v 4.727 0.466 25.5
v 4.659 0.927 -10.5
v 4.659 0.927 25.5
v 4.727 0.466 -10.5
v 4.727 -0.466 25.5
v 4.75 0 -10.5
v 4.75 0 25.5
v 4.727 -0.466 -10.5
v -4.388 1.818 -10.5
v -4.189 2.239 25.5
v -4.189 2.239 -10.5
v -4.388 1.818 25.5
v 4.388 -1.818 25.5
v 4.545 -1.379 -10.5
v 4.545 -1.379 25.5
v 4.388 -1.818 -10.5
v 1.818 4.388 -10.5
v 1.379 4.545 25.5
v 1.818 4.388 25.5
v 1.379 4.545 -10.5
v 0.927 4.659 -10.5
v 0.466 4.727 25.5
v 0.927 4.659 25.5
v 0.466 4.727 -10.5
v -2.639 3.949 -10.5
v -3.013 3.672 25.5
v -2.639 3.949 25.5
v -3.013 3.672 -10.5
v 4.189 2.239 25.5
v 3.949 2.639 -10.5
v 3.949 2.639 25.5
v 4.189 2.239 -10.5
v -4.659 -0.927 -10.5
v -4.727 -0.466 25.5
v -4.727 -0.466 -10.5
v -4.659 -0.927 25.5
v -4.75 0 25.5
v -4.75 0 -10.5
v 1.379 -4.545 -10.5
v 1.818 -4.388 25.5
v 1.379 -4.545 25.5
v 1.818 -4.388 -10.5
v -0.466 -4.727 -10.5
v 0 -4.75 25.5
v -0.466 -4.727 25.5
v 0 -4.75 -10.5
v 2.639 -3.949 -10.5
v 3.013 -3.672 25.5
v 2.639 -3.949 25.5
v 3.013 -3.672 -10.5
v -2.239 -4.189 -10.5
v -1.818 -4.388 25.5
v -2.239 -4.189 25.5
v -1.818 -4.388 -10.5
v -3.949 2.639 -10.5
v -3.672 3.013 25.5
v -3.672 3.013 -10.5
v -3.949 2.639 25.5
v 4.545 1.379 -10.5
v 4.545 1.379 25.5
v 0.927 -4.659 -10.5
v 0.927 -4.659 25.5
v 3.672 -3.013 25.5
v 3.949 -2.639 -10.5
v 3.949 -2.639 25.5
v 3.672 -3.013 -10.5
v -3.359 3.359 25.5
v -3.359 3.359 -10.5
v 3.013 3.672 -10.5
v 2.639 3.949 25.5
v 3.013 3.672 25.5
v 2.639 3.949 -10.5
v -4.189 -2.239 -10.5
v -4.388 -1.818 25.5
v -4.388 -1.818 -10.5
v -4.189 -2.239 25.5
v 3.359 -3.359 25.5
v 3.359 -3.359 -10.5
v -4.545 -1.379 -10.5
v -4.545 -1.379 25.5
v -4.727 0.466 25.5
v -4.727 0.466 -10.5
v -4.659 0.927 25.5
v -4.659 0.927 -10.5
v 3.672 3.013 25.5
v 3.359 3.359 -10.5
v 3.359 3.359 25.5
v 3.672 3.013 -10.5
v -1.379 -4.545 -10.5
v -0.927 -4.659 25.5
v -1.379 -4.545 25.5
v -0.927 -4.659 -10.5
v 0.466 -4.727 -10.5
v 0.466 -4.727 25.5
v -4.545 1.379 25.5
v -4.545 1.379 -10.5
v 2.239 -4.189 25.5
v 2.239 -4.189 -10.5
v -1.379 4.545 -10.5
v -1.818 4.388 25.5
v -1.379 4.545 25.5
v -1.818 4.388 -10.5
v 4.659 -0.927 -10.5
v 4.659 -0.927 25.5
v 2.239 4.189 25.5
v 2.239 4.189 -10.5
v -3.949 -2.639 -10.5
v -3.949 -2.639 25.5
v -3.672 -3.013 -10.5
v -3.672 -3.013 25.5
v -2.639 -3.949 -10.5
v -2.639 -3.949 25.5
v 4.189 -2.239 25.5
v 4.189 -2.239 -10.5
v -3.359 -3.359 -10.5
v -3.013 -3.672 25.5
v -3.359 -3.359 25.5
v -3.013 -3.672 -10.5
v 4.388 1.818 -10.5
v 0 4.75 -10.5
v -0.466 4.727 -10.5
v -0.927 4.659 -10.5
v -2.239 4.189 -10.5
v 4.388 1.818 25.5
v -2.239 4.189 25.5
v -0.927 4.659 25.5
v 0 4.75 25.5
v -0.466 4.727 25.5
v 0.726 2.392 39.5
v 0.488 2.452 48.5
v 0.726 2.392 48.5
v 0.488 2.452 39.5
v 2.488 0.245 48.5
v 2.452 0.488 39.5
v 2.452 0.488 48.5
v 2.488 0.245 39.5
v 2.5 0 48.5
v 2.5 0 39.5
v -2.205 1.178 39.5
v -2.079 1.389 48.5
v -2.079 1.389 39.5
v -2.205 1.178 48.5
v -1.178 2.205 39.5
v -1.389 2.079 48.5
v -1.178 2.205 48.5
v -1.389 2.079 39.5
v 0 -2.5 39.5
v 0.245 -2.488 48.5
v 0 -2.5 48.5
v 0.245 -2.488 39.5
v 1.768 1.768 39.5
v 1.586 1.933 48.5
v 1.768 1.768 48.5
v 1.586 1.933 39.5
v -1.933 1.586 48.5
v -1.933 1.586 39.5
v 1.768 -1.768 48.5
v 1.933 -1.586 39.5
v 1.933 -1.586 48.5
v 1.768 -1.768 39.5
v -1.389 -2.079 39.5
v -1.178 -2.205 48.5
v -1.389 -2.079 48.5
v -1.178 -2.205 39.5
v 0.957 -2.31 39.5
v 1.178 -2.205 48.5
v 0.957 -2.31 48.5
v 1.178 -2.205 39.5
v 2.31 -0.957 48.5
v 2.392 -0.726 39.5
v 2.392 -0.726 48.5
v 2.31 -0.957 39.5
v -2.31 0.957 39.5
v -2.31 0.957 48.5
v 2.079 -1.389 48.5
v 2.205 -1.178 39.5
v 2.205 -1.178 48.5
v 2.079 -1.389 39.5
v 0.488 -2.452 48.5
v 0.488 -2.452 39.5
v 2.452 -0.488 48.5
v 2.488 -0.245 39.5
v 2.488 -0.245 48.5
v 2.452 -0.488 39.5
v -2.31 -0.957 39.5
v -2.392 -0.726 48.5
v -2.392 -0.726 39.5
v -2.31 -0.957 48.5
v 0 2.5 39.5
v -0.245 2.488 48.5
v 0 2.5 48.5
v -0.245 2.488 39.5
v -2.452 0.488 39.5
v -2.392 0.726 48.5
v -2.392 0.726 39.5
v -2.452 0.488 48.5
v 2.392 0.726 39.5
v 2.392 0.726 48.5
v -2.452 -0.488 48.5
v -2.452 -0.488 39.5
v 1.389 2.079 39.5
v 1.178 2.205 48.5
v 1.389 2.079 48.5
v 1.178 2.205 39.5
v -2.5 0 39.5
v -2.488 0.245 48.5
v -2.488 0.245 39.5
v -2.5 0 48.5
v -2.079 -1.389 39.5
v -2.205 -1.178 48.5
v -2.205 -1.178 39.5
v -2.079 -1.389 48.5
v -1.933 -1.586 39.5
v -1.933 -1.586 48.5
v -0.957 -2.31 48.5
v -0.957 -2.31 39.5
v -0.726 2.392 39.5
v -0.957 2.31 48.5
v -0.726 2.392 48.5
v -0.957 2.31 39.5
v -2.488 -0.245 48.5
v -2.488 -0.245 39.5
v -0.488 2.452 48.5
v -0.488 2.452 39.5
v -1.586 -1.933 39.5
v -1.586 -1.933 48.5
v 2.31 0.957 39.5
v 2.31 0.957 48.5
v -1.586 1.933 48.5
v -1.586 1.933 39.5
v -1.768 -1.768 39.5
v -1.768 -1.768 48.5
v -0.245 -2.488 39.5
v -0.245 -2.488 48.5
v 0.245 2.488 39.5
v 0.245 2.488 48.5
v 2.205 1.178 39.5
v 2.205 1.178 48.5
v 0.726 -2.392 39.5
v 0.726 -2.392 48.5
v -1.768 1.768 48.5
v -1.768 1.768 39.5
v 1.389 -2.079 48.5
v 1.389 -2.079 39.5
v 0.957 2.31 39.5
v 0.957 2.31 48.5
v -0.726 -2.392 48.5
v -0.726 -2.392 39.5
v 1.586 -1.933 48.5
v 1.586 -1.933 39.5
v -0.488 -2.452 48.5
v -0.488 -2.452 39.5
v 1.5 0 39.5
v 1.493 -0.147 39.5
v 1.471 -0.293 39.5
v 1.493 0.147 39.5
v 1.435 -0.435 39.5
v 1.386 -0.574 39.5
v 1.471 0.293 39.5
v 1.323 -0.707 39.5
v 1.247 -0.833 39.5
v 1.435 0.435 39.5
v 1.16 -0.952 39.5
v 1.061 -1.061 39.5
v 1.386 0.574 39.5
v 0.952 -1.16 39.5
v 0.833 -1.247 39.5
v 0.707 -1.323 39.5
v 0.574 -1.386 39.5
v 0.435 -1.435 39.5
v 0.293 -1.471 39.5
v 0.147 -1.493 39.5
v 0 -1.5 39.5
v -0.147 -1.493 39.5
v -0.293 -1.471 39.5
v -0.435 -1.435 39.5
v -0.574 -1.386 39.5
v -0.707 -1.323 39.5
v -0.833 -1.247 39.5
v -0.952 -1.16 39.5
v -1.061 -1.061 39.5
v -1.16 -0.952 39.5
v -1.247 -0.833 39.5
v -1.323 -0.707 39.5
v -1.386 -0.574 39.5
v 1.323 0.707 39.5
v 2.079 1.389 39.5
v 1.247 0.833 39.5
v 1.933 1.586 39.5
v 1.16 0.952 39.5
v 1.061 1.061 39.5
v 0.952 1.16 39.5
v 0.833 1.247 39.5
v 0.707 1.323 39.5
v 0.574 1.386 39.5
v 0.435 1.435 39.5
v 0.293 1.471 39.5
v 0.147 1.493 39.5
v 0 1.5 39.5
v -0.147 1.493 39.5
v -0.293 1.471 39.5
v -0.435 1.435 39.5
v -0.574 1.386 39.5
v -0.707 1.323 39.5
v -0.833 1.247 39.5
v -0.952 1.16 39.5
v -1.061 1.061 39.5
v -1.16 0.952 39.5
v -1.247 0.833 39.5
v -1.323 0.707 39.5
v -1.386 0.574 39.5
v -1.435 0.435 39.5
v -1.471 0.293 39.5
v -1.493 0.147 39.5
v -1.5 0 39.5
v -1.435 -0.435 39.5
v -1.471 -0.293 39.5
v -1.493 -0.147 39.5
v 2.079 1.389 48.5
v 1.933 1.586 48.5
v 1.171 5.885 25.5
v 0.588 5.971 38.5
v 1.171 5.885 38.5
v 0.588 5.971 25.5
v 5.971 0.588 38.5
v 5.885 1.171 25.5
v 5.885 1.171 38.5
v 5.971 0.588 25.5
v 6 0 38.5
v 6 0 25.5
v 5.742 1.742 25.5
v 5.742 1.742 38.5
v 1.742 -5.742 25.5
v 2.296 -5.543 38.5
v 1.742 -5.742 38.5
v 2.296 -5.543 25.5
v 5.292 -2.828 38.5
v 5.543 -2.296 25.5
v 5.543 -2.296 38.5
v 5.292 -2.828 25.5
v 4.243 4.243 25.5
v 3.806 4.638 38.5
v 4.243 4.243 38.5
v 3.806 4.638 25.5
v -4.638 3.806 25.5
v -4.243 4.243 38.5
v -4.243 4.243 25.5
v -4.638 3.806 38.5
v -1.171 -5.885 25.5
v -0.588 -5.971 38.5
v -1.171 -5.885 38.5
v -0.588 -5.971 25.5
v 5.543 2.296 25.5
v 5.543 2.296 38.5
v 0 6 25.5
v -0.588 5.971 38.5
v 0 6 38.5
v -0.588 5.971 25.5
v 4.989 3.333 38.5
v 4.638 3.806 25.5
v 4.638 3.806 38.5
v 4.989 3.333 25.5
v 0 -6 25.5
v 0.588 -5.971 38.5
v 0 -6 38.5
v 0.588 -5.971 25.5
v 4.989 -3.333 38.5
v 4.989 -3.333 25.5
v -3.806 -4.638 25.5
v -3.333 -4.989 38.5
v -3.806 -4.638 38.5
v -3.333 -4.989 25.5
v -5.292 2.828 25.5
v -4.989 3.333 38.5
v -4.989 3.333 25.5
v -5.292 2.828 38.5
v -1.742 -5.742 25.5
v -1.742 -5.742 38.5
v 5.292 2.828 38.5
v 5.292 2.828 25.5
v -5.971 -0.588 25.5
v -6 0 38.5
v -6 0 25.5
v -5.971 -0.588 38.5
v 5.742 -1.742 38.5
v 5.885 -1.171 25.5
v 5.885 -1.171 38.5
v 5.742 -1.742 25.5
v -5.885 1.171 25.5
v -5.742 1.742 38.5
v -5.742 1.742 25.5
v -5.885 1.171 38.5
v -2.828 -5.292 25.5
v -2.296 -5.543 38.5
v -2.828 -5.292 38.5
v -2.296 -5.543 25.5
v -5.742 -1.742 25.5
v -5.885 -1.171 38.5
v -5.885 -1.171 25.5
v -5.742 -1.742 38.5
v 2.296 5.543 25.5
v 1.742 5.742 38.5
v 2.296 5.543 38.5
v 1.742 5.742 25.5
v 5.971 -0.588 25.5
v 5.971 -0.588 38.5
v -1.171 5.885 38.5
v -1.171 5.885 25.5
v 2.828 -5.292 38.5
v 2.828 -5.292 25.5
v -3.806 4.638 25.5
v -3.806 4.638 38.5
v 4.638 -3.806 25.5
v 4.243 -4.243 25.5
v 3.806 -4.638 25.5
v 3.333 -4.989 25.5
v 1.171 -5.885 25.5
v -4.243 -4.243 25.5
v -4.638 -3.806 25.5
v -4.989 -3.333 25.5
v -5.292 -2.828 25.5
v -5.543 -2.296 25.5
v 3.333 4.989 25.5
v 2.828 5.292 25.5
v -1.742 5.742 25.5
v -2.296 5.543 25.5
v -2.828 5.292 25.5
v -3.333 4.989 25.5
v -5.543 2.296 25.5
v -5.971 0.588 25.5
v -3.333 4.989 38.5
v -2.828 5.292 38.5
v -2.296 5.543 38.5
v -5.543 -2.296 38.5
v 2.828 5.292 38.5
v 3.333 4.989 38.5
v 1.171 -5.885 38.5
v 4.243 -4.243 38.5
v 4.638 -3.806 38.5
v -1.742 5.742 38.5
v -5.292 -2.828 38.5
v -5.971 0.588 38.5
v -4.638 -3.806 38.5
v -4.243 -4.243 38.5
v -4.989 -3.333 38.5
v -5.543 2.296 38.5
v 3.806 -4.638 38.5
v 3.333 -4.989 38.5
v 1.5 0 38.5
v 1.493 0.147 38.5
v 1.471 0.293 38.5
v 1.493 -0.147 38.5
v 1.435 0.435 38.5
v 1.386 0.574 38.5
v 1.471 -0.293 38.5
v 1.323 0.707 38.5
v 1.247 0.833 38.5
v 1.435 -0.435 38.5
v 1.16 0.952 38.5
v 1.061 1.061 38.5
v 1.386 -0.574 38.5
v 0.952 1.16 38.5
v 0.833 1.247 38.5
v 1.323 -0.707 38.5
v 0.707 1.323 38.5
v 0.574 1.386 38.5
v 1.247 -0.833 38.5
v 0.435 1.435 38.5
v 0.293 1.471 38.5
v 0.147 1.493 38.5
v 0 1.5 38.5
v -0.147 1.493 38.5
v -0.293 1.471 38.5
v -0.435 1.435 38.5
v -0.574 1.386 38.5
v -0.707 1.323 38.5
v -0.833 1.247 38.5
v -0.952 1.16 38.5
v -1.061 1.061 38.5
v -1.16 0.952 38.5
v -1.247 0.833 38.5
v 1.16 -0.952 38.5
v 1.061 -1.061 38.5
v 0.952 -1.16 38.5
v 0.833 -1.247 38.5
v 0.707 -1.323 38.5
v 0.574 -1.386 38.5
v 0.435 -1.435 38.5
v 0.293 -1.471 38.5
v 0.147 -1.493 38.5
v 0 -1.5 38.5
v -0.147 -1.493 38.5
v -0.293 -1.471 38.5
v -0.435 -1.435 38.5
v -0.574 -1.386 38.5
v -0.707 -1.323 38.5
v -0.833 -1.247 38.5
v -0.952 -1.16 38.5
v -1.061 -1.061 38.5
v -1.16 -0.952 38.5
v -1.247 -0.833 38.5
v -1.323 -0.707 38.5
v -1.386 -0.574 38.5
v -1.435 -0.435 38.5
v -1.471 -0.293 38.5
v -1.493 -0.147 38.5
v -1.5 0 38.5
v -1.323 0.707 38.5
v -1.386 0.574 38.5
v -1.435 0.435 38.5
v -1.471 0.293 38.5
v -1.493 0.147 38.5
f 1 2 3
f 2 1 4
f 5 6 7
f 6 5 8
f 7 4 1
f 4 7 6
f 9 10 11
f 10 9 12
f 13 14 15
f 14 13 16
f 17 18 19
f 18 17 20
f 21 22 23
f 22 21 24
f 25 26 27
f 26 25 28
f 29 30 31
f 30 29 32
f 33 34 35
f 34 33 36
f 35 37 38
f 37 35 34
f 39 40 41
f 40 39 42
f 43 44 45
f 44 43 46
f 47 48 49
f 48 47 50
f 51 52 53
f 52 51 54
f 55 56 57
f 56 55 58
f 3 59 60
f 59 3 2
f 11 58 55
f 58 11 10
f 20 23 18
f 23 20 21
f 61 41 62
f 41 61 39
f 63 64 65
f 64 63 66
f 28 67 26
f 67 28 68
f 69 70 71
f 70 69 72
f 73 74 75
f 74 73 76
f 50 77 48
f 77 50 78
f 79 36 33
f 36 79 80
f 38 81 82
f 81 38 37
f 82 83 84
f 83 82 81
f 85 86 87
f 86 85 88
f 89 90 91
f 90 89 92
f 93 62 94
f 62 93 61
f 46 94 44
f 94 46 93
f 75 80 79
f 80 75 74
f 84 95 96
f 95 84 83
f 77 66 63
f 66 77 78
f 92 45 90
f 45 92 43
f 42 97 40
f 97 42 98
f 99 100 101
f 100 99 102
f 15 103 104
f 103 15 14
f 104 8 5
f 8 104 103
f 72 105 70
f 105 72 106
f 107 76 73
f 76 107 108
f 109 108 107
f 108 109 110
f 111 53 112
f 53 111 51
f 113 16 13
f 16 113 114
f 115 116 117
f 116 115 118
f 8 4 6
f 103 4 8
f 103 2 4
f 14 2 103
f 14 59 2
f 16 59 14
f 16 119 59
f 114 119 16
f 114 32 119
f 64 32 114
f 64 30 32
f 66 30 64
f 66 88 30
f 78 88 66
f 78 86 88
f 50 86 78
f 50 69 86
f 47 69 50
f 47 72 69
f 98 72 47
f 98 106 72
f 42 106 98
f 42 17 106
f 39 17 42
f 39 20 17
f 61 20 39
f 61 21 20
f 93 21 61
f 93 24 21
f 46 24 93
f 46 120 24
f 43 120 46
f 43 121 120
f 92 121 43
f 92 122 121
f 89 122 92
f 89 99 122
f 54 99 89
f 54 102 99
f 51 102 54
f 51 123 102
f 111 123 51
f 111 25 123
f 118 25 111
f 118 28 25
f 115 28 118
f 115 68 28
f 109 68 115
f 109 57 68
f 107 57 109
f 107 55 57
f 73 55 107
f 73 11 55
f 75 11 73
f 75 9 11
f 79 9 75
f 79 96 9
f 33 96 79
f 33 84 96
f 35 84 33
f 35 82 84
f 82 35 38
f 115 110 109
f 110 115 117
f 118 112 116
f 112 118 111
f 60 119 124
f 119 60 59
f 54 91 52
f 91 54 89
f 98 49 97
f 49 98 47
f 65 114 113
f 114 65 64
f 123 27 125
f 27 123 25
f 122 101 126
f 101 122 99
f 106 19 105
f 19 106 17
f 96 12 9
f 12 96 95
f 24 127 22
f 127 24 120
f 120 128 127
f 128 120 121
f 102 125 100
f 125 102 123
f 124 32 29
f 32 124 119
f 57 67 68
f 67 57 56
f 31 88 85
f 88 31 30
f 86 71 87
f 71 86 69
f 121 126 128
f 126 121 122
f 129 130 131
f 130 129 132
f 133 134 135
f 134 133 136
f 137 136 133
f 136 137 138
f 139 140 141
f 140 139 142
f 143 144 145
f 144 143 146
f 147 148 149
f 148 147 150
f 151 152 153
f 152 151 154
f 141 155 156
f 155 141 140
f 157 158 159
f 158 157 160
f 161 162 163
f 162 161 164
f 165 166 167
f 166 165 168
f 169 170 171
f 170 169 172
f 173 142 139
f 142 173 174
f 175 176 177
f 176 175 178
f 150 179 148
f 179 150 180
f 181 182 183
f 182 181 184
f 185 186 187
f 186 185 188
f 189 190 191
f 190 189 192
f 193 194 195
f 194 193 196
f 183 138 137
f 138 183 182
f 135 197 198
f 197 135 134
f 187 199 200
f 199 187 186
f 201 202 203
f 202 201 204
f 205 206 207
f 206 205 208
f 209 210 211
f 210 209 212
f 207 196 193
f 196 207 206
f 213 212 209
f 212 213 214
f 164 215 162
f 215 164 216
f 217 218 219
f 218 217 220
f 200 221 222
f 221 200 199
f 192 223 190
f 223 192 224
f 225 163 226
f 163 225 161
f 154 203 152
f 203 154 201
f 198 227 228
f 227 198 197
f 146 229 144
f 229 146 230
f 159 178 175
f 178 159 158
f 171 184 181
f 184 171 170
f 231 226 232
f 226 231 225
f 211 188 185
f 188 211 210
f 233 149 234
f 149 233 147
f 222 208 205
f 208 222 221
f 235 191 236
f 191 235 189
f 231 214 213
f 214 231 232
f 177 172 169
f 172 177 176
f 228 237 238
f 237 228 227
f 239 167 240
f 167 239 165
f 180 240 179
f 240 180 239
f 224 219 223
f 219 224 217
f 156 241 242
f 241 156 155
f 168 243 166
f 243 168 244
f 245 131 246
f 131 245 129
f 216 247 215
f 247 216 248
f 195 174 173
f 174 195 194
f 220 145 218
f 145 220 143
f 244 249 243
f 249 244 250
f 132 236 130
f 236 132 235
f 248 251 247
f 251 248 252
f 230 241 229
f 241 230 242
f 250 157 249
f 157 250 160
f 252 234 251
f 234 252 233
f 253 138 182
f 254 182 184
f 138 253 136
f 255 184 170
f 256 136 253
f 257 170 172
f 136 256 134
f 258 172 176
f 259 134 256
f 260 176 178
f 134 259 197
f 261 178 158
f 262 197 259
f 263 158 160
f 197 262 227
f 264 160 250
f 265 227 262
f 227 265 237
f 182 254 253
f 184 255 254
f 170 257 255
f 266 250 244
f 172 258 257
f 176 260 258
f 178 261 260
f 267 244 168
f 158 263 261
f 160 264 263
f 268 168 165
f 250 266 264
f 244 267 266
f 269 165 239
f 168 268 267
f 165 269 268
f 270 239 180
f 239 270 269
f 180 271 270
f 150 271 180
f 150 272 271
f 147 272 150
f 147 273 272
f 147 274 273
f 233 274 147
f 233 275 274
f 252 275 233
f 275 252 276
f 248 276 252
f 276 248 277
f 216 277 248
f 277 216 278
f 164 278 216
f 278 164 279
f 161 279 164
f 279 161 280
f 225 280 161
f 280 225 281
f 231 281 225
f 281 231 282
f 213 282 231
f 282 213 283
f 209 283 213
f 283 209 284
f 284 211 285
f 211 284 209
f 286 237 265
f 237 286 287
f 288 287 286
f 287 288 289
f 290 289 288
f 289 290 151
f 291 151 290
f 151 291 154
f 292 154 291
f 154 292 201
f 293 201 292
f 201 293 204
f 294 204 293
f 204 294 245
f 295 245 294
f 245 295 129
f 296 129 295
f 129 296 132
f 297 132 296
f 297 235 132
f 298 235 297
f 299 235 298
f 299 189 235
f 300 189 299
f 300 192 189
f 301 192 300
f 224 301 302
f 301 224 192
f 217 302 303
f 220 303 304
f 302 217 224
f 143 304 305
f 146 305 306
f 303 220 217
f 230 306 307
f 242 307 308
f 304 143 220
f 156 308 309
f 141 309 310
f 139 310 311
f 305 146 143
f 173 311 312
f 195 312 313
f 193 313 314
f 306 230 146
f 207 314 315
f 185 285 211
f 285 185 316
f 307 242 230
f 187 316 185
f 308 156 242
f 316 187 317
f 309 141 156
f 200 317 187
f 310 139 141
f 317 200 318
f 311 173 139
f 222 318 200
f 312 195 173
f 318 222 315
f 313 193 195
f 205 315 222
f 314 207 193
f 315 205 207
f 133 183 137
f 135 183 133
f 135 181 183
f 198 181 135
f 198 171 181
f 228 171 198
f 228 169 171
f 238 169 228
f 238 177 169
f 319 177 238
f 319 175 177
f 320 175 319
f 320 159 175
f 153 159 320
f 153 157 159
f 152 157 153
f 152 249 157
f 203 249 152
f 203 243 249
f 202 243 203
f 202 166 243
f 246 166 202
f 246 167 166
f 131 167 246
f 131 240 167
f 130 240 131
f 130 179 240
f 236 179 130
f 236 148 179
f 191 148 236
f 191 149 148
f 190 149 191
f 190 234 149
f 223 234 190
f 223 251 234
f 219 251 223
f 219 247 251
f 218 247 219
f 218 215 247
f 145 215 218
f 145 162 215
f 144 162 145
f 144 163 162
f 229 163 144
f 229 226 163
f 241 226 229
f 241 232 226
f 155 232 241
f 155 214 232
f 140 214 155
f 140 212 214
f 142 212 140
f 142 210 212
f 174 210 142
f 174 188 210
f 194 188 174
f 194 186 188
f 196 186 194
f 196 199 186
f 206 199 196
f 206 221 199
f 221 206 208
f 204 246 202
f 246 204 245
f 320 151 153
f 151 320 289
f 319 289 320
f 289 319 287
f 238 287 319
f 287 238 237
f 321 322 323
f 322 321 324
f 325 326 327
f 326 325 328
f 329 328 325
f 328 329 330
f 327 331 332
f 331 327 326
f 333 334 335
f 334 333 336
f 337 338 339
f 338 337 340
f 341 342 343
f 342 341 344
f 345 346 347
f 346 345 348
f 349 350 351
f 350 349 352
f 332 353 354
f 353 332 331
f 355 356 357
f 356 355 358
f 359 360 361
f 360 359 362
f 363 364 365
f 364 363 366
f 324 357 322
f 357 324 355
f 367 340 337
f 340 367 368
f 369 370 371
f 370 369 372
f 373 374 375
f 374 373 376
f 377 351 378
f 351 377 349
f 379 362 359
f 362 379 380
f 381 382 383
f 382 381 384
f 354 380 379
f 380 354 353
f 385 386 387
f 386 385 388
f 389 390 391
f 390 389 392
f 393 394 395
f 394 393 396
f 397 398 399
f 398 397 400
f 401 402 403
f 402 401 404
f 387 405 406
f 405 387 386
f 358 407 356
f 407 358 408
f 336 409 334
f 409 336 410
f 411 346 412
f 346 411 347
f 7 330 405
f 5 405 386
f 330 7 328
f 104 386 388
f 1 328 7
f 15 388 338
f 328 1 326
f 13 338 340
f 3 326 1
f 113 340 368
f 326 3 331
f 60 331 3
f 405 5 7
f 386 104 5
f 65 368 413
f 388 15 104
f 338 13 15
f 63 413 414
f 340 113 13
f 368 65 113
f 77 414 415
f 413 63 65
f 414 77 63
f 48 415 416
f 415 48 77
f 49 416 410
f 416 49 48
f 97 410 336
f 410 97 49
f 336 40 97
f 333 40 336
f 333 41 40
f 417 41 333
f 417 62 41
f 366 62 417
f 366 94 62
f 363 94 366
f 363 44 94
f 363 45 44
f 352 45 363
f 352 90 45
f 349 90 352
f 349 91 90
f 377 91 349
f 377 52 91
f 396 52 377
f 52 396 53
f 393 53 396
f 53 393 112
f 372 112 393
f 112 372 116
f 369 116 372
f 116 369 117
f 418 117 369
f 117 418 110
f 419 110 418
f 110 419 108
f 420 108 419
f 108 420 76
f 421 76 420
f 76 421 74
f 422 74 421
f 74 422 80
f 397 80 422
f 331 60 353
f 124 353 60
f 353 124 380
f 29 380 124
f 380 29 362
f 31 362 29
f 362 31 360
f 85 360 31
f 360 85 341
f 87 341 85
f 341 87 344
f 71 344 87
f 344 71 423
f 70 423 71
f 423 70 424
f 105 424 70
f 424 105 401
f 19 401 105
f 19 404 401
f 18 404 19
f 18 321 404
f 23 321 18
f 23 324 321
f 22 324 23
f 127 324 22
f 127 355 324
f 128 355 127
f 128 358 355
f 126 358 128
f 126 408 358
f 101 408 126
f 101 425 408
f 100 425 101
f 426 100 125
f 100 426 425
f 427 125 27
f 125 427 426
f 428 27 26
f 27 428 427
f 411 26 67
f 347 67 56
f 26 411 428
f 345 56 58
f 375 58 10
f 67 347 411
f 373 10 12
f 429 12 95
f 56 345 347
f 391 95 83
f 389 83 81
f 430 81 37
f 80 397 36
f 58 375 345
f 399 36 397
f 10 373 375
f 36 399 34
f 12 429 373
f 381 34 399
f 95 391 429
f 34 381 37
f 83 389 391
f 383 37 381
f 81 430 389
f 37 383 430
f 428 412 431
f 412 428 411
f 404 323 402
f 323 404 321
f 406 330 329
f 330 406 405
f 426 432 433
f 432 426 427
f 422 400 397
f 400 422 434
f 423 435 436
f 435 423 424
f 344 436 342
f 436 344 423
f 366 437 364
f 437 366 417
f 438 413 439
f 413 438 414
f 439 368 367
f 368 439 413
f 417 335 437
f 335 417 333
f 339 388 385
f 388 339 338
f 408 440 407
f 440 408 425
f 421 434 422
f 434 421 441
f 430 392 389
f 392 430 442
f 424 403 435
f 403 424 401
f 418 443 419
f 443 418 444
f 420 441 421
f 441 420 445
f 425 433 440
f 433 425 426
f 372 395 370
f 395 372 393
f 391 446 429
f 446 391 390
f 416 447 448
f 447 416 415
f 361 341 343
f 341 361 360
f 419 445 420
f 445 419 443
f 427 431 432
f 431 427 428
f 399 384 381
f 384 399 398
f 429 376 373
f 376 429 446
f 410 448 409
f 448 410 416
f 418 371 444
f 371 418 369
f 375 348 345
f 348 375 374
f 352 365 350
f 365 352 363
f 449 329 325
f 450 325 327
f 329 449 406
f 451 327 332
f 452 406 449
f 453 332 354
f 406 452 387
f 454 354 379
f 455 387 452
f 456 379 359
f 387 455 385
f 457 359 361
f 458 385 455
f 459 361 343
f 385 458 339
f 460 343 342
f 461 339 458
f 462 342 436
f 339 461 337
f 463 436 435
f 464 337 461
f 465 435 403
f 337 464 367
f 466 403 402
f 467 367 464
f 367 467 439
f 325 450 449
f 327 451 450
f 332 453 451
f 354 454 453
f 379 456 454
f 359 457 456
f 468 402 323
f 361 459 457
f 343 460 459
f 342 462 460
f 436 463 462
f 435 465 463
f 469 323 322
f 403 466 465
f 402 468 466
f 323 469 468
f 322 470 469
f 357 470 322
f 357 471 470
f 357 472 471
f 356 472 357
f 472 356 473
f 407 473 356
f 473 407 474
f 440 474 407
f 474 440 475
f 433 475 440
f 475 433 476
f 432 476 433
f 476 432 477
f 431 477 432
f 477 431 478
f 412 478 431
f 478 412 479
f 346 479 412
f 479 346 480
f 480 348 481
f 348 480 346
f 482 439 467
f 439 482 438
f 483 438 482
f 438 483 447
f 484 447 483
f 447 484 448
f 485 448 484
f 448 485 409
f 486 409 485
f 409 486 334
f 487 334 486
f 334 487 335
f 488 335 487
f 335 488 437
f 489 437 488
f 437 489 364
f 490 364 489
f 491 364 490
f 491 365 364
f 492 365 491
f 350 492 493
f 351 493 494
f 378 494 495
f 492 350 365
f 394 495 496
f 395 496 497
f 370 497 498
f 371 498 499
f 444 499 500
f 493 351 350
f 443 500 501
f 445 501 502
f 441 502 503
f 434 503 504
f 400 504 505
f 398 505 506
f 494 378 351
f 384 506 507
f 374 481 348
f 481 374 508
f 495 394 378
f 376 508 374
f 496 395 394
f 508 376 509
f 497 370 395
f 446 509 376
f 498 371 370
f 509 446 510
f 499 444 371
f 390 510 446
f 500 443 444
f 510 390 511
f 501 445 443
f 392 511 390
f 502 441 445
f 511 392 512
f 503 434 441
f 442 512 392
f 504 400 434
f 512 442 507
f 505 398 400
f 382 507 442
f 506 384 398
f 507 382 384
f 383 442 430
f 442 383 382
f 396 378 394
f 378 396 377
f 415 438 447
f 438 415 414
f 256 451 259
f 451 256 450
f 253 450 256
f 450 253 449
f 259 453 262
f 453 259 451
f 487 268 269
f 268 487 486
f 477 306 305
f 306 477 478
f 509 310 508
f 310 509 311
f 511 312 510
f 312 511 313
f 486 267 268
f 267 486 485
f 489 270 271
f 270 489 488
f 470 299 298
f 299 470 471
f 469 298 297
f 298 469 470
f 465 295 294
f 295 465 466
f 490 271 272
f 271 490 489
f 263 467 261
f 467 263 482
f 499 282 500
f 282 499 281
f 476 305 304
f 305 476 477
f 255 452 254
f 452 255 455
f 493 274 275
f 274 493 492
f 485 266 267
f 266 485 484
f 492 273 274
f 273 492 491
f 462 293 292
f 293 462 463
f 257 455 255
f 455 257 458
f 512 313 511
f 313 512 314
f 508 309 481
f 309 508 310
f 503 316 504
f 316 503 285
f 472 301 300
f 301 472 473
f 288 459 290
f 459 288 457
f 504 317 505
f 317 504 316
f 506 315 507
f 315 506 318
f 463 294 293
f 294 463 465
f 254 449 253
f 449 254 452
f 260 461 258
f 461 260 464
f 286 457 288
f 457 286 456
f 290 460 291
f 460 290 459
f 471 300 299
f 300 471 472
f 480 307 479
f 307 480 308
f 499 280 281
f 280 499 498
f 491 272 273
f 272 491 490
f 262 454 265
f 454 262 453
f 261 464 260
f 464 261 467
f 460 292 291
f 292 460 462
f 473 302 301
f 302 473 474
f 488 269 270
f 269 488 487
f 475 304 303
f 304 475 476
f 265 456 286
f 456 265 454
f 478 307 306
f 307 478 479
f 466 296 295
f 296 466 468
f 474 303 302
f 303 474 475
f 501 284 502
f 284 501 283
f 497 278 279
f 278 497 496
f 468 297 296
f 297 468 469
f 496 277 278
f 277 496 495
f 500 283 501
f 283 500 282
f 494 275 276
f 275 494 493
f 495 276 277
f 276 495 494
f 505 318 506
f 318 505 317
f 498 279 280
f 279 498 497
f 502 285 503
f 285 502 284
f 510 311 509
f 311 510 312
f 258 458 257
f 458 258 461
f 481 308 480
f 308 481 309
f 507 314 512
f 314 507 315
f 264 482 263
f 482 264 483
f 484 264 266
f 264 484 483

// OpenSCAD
// Hose-barb reducer: joins 8 mm and 5 mm silicone tubing
// Print orientation: standing upright along +Z

$fn = 64;

// ---- Dimensions (mm) ----
t1      = 8;     // larger tubing inner diameter
t2      = 5;     // smaller tubing inner diameter
bore    = 3;     // through-bore diameter
h1      = 20;    // height of first barb section (z = 0..20)
d1_bot  = 7.5;   // outer diameter of barb at bottom
d1_top  = 9.5;   // outer diameter of barb at top
c       = 12;    // collar diameter
h2      = 8;     // height of second barb section (z = 25..41)
d2_bot  = 6.5;   // outer diameter of second barb at bottom
d2_top  = 5.0;   // outer diameter of second barb at top
eps     = 0.5;   // overcut for clean differences

// ---- Derived ----
x1 = (d1_bot + d1_top) / 2;   // average barb diameter (section 1)
x2 = (d2_bot + d2_top) / 2;   // average barb diameter (section 2)

// ---- Model ----
union() {
    // Section 1: two stacked barbs for 8 mm tubing
    for (s = [-1, 1])
        translate([0, 0, s * h1 / 2 - eps])
            linear_extrude(h1 + 2 * eps)
                circle(d = d1_bot + (d1_top - d1_bot) * abs(s), $fn = 64);

    // Section 2: cylindrical collar
    translate([0, 0, h1 + c / 2 - eps])
        cylinder(d = c, h = c + 2 * eps, $fn = 64);

    // Section 3: two stacked barbs for 5 mm tubing
    for (s = [-1, 1])
        translate([0, 0, h1 + c + s * h2 - eps])
            linear_extrude(h2 + 2 * eps)
                circle(d = d2_bot + (d2_top - d2_bot) * abs(s), $fn = 64);

    // Through-bore
    translate([0, 0, -eps])
        cylinder(d = bore, h = h1 + c + h2 + 2 * eps, $fn = 64);
}
